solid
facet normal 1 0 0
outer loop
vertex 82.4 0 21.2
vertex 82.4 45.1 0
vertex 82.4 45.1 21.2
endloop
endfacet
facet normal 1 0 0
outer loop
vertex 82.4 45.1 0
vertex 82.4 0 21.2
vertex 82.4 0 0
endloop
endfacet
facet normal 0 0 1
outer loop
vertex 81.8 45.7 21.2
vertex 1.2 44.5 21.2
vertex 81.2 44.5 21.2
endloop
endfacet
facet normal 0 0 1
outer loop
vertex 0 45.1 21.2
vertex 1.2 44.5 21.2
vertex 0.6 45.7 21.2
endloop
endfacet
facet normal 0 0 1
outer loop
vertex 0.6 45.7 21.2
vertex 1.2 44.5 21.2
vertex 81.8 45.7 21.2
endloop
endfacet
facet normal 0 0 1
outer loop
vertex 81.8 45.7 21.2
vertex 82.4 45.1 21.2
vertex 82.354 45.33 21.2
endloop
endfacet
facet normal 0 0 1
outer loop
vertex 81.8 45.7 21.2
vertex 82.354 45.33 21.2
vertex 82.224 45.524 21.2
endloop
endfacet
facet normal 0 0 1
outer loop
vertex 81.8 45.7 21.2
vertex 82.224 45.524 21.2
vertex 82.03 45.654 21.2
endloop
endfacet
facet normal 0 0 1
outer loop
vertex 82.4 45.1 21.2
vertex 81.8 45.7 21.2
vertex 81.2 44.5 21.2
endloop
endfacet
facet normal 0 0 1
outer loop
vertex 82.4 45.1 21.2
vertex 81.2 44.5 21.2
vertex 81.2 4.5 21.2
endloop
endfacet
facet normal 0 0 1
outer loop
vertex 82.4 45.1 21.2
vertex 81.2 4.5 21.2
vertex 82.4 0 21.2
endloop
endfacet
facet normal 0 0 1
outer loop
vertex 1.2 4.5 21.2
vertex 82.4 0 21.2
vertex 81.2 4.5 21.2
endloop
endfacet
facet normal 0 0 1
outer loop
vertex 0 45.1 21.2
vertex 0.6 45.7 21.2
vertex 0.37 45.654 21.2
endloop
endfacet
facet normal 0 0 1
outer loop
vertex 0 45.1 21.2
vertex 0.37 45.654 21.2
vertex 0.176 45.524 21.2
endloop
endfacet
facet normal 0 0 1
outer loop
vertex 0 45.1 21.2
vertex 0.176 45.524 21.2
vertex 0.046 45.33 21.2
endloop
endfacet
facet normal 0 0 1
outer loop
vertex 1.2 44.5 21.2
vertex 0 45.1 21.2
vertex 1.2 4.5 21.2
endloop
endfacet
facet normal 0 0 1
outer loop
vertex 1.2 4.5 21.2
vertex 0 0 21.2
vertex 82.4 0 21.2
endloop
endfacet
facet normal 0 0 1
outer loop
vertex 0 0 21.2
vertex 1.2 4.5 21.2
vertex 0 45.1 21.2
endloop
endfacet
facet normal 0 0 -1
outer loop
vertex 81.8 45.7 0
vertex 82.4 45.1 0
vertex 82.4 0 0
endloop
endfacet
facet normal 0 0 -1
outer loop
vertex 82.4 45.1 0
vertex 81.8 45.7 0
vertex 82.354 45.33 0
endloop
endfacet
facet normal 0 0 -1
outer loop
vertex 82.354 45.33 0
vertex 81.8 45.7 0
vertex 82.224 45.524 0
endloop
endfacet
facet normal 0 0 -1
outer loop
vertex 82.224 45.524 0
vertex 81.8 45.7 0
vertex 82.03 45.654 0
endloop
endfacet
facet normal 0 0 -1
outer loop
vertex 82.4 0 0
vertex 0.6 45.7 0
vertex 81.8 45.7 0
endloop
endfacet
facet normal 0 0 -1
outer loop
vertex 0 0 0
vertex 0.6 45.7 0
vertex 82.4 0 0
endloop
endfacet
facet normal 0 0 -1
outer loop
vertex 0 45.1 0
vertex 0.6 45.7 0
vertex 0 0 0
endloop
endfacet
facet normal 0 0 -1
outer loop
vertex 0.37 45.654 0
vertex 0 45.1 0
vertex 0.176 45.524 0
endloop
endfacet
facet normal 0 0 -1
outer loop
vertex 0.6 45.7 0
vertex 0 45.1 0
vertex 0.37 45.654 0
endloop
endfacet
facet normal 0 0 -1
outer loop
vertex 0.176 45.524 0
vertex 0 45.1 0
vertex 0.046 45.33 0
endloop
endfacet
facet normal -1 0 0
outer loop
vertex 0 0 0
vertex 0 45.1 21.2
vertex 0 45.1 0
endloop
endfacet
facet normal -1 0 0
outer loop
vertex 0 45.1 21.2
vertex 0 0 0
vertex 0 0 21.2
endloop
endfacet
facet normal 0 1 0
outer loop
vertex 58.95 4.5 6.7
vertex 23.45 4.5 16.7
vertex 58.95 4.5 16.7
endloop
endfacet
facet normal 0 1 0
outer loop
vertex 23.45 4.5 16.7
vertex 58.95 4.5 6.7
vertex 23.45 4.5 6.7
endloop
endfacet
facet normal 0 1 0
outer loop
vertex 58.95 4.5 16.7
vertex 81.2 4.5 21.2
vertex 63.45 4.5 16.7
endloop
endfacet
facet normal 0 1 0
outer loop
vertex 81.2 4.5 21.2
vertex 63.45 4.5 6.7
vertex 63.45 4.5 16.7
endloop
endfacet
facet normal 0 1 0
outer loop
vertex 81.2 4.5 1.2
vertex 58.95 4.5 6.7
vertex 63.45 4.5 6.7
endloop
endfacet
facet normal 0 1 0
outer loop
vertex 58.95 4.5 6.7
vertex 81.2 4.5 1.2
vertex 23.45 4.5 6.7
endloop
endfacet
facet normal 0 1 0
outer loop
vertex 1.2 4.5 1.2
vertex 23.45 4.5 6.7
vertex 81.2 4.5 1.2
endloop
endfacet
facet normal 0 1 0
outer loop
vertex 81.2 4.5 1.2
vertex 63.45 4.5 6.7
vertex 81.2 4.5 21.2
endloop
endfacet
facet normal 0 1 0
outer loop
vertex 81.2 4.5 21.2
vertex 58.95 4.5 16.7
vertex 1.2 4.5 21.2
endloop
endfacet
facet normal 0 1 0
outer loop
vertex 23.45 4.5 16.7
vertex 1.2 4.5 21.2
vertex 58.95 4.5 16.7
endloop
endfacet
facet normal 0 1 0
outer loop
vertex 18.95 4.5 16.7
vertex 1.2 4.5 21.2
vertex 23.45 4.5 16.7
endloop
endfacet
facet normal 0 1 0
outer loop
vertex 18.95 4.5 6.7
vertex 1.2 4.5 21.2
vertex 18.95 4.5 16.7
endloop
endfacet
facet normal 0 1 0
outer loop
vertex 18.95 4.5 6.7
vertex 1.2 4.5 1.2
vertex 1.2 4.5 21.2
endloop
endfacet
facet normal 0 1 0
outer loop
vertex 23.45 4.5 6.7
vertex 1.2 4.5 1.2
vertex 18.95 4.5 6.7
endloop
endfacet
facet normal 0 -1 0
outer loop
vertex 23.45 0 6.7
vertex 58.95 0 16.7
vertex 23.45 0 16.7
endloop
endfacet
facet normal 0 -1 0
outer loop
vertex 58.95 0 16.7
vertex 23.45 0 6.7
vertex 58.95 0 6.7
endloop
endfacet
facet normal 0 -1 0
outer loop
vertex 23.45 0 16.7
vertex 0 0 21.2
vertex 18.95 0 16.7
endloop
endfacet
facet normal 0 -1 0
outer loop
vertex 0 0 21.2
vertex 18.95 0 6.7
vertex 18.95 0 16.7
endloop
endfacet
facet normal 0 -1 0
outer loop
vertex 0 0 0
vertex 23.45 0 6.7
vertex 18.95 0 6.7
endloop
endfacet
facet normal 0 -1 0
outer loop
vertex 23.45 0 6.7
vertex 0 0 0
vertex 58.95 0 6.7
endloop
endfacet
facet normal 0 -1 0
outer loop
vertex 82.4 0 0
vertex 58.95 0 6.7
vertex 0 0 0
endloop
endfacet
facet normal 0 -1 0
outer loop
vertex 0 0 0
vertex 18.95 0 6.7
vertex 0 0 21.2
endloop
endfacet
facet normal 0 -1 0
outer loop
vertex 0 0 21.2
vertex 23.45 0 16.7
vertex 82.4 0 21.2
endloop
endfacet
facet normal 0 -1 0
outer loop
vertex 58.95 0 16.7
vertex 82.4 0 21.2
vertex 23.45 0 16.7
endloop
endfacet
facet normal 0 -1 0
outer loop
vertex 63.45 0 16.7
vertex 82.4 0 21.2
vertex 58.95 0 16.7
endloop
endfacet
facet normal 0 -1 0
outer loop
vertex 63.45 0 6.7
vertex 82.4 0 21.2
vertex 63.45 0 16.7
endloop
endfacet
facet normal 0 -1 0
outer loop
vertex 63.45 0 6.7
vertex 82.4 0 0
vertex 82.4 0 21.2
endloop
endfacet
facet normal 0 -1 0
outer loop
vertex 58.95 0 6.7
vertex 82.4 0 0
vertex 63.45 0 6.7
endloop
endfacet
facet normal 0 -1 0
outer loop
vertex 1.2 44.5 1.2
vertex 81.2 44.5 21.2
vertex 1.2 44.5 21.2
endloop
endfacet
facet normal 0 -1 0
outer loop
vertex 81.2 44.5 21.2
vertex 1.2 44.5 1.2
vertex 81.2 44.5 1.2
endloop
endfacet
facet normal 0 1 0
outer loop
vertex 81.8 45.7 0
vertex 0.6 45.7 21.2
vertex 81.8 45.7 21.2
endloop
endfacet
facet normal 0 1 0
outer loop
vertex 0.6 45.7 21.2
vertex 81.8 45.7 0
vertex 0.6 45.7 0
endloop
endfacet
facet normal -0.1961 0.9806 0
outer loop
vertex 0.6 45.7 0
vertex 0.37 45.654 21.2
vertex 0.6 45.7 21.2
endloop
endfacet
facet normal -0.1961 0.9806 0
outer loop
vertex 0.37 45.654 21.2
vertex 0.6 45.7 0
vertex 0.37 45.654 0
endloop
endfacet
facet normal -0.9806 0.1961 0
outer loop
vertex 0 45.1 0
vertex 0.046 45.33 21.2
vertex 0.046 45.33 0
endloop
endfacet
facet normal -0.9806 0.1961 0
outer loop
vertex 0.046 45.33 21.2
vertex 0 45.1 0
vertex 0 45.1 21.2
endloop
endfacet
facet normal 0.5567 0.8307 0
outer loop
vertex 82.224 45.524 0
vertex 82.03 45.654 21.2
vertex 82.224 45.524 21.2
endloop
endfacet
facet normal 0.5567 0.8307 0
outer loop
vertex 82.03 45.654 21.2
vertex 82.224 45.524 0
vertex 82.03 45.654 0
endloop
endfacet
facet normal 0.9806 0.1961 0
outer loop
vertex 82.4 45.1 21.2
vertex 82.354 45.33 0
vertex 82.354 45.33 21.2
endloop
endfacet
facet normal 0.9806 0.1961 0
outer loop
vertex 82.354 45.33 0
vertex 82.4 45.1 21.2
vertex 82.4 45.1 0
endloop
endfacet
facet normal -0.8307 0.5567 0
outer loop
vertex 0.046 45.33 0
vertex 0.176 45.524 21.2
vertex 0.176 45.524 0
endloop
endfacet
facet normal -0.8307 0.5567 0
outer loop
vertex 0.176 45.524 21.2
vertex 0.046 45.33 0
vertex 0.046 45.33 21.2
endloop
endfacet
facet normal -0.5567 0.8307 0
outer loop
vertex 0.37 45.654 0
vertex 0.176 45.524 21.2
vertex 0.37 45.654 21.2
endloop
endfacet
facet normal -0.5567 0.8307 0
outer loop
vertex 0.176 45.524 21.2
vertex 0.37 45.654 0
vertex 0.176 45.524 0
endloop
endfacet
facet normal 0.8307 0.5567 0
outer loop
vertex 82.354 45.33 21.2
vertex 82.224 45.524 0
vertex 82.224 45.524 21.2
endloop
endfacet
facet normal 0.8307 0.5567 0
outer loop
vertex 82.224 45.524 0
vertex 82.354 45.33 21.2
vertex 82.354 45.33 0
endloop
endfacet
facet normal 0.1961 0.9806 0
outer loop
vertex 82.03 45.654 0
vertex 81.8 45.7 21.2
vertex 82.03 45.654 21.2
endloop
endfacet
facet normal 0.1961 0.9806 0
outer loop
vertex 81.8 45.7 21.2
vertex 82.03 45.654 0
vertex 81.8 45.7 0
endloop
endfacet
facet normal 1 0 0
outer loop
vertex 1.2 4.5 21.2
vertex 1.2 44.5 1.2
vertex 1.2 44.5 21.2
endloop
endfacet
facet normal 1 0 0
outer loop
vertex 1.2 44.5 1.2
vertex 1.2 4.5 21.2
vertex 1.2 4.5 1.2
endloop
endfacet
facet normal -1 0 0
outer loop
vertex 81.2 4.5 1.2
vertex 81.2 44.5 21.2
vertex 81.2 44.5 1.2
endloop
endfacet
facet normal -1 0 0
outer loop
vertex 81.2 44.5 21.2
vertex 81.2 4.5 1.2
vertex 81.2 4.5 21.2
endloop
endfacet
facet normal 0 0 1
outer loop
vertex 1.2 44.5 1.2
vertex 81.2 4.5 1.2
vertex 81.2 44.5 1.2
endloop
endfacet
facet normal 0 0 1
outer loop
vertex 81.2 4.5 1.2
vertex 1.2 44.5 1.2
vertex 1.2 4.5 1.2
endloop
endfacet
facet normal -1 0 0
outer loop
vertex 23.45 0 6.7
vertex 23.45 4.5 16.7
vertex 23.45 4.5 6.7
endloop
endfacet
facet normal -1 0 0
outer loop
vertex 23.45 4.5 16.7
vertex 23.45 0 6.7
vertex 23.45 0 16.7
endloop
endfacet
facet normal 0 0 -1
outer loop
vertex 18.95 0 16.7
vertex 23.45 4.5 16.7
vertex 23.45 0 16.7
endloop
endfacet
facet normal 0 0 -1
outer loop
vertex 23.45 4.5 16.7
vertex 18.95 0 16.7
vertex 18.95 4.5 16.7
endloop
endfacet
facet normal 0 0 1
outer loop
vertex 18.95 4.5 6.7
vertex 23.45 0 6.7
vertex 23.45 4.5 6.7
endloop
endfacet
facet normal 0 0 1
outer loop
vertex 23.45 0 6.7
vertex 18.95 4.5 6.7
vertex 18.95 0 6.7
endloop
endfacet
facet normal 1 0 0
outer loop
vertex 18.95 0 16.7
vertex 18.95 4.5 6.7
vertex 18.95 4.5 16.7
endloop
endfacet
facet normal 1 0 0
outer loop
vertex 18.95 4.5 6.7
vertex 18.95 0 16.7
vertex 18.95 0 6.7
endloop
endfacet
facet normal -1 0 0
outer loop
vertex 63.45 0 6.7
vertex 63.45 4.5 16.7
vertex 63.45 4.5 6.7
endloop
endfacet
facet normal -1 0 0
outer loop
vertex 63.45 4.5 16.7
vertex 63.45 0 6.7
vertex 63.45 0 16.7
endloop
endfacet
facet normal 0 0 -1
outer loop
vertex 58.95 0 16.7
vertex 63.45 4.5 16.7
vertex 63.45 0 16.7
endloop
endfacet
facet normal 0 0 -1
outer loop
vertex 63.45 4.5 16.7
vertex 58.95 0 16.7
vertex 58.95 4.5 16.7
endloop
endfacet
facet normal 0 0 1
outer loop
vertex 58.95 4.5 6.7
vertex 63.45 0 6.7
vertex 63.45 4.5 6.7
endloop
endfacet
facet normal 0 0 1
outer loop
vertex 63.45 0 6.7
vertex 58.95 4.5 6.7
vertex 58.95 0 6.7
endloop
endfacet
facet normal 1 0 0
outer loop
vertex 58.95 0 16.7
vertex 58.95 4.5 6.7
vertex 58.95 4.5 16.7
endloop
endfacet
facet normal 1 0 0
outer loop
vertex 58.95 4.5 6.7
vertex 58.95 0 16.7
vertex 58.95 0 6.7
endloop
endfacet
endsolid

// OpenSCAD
inner_width = 80; // .1
inner_height = 20; // .1
inner_depth = 40; // .1

wall_thickness = 1.2; // .1
bottom_thickness = 1.2; // .1

hooks_count = 2;

/* [Hidden] */

$fn = 16;

// Preset dimensions.
hook_width = 4.5;
hole_distance = 40;
tiny = 0.001;

// Calculated outer dimensions.
container_width = inner_width + wall_thickness * 2;
container_height = inner_height + bottom_thickness;
container_depth = inner_depth + wall_thickness + hook_width;

hooks_width = hooks_count * hook_width + (hooks_count - 1) * (hole_distance - hook_width);

// Used to debug hook positioning.
fill_in = false;

// Render.
difference() {
    box();
    
    translate([container_width / 2 - hooks_width / 2, 0, container_height]) {
        for (i = [0:hooks_count - 1]) {
            translate([i * hole_distance, 0, 0]) {
                hook();
            }
        }
    }
}

module hook() {
    bottom_to_top = 15.5;
    top_cutout = 10;

    translate([0, 0, -hook_width]) {
        if (fill_in) {
            // Fill in above top cutout.
            # cube(hook_width);
        }
        
        // Top cutout.
        translate([0, 0, -top_cutout]) {
            translate([0, -tiny, 0]) {
                cube([hook_width, hook_width + tiny * 2, top_cutout]);
            }
            
            translate([0, 0, -bottom_to_top]) {
                if (fill_in) {
                    // Fill in between bottom and top cutout.
                    # cube([hook_width, hook_width, bottom_to_top]);
                }
                
                // Bottom cutout.
                translate([0, -tiny, -hook_width * 2]) {
                    cube([hook_width, hook_width + tiny * 2, hook_width * 2]);
                }
            }
        }
    }
}

module box() {
    module frontLeft() {
        translate([wall_thickness / 2, container_depth - wall_thickness / 2, 0]) {
            cylinder(h=container_height, d=wall_thickness);
        }
    }
    
    module frontRight() {
        translate([container_width - wall_thickness / 2, container_depth - wall_thickness / 2, 0]) {
            cylinder(h=container_height, d=wall_thickness);
        }
    }
    
    // Back (hooks side).
    cube([container_width, hook_width, container_height]);
    
    // Front.
    hull() {
        translate([wall_thickness, container_depth - wall_thickness, 0]) {
            cube([inner_width, wall_thickness, container_height]);
        }
        frontLeft();
        frontRight();
    }
    
    // Left.
    hull() {
        cube([wall_thickness, inner_depth + hook_width, container_height]);
        frontLeft();
    }
    
    // Right.
    hull() {
        translate([container_width - wall_thickness, 0, 0]) {
            cube([wall_thickness, inner_depth + hook_width, container_height]);
        }
        frontRight();
    }
    
    // Bottom.
    translate([wall_thickness / 2, 0, 0]) {
        cube([container_width - wall_thickness, container_depth - wall_thickness / 2, bottom_thickness]);
    }
}
